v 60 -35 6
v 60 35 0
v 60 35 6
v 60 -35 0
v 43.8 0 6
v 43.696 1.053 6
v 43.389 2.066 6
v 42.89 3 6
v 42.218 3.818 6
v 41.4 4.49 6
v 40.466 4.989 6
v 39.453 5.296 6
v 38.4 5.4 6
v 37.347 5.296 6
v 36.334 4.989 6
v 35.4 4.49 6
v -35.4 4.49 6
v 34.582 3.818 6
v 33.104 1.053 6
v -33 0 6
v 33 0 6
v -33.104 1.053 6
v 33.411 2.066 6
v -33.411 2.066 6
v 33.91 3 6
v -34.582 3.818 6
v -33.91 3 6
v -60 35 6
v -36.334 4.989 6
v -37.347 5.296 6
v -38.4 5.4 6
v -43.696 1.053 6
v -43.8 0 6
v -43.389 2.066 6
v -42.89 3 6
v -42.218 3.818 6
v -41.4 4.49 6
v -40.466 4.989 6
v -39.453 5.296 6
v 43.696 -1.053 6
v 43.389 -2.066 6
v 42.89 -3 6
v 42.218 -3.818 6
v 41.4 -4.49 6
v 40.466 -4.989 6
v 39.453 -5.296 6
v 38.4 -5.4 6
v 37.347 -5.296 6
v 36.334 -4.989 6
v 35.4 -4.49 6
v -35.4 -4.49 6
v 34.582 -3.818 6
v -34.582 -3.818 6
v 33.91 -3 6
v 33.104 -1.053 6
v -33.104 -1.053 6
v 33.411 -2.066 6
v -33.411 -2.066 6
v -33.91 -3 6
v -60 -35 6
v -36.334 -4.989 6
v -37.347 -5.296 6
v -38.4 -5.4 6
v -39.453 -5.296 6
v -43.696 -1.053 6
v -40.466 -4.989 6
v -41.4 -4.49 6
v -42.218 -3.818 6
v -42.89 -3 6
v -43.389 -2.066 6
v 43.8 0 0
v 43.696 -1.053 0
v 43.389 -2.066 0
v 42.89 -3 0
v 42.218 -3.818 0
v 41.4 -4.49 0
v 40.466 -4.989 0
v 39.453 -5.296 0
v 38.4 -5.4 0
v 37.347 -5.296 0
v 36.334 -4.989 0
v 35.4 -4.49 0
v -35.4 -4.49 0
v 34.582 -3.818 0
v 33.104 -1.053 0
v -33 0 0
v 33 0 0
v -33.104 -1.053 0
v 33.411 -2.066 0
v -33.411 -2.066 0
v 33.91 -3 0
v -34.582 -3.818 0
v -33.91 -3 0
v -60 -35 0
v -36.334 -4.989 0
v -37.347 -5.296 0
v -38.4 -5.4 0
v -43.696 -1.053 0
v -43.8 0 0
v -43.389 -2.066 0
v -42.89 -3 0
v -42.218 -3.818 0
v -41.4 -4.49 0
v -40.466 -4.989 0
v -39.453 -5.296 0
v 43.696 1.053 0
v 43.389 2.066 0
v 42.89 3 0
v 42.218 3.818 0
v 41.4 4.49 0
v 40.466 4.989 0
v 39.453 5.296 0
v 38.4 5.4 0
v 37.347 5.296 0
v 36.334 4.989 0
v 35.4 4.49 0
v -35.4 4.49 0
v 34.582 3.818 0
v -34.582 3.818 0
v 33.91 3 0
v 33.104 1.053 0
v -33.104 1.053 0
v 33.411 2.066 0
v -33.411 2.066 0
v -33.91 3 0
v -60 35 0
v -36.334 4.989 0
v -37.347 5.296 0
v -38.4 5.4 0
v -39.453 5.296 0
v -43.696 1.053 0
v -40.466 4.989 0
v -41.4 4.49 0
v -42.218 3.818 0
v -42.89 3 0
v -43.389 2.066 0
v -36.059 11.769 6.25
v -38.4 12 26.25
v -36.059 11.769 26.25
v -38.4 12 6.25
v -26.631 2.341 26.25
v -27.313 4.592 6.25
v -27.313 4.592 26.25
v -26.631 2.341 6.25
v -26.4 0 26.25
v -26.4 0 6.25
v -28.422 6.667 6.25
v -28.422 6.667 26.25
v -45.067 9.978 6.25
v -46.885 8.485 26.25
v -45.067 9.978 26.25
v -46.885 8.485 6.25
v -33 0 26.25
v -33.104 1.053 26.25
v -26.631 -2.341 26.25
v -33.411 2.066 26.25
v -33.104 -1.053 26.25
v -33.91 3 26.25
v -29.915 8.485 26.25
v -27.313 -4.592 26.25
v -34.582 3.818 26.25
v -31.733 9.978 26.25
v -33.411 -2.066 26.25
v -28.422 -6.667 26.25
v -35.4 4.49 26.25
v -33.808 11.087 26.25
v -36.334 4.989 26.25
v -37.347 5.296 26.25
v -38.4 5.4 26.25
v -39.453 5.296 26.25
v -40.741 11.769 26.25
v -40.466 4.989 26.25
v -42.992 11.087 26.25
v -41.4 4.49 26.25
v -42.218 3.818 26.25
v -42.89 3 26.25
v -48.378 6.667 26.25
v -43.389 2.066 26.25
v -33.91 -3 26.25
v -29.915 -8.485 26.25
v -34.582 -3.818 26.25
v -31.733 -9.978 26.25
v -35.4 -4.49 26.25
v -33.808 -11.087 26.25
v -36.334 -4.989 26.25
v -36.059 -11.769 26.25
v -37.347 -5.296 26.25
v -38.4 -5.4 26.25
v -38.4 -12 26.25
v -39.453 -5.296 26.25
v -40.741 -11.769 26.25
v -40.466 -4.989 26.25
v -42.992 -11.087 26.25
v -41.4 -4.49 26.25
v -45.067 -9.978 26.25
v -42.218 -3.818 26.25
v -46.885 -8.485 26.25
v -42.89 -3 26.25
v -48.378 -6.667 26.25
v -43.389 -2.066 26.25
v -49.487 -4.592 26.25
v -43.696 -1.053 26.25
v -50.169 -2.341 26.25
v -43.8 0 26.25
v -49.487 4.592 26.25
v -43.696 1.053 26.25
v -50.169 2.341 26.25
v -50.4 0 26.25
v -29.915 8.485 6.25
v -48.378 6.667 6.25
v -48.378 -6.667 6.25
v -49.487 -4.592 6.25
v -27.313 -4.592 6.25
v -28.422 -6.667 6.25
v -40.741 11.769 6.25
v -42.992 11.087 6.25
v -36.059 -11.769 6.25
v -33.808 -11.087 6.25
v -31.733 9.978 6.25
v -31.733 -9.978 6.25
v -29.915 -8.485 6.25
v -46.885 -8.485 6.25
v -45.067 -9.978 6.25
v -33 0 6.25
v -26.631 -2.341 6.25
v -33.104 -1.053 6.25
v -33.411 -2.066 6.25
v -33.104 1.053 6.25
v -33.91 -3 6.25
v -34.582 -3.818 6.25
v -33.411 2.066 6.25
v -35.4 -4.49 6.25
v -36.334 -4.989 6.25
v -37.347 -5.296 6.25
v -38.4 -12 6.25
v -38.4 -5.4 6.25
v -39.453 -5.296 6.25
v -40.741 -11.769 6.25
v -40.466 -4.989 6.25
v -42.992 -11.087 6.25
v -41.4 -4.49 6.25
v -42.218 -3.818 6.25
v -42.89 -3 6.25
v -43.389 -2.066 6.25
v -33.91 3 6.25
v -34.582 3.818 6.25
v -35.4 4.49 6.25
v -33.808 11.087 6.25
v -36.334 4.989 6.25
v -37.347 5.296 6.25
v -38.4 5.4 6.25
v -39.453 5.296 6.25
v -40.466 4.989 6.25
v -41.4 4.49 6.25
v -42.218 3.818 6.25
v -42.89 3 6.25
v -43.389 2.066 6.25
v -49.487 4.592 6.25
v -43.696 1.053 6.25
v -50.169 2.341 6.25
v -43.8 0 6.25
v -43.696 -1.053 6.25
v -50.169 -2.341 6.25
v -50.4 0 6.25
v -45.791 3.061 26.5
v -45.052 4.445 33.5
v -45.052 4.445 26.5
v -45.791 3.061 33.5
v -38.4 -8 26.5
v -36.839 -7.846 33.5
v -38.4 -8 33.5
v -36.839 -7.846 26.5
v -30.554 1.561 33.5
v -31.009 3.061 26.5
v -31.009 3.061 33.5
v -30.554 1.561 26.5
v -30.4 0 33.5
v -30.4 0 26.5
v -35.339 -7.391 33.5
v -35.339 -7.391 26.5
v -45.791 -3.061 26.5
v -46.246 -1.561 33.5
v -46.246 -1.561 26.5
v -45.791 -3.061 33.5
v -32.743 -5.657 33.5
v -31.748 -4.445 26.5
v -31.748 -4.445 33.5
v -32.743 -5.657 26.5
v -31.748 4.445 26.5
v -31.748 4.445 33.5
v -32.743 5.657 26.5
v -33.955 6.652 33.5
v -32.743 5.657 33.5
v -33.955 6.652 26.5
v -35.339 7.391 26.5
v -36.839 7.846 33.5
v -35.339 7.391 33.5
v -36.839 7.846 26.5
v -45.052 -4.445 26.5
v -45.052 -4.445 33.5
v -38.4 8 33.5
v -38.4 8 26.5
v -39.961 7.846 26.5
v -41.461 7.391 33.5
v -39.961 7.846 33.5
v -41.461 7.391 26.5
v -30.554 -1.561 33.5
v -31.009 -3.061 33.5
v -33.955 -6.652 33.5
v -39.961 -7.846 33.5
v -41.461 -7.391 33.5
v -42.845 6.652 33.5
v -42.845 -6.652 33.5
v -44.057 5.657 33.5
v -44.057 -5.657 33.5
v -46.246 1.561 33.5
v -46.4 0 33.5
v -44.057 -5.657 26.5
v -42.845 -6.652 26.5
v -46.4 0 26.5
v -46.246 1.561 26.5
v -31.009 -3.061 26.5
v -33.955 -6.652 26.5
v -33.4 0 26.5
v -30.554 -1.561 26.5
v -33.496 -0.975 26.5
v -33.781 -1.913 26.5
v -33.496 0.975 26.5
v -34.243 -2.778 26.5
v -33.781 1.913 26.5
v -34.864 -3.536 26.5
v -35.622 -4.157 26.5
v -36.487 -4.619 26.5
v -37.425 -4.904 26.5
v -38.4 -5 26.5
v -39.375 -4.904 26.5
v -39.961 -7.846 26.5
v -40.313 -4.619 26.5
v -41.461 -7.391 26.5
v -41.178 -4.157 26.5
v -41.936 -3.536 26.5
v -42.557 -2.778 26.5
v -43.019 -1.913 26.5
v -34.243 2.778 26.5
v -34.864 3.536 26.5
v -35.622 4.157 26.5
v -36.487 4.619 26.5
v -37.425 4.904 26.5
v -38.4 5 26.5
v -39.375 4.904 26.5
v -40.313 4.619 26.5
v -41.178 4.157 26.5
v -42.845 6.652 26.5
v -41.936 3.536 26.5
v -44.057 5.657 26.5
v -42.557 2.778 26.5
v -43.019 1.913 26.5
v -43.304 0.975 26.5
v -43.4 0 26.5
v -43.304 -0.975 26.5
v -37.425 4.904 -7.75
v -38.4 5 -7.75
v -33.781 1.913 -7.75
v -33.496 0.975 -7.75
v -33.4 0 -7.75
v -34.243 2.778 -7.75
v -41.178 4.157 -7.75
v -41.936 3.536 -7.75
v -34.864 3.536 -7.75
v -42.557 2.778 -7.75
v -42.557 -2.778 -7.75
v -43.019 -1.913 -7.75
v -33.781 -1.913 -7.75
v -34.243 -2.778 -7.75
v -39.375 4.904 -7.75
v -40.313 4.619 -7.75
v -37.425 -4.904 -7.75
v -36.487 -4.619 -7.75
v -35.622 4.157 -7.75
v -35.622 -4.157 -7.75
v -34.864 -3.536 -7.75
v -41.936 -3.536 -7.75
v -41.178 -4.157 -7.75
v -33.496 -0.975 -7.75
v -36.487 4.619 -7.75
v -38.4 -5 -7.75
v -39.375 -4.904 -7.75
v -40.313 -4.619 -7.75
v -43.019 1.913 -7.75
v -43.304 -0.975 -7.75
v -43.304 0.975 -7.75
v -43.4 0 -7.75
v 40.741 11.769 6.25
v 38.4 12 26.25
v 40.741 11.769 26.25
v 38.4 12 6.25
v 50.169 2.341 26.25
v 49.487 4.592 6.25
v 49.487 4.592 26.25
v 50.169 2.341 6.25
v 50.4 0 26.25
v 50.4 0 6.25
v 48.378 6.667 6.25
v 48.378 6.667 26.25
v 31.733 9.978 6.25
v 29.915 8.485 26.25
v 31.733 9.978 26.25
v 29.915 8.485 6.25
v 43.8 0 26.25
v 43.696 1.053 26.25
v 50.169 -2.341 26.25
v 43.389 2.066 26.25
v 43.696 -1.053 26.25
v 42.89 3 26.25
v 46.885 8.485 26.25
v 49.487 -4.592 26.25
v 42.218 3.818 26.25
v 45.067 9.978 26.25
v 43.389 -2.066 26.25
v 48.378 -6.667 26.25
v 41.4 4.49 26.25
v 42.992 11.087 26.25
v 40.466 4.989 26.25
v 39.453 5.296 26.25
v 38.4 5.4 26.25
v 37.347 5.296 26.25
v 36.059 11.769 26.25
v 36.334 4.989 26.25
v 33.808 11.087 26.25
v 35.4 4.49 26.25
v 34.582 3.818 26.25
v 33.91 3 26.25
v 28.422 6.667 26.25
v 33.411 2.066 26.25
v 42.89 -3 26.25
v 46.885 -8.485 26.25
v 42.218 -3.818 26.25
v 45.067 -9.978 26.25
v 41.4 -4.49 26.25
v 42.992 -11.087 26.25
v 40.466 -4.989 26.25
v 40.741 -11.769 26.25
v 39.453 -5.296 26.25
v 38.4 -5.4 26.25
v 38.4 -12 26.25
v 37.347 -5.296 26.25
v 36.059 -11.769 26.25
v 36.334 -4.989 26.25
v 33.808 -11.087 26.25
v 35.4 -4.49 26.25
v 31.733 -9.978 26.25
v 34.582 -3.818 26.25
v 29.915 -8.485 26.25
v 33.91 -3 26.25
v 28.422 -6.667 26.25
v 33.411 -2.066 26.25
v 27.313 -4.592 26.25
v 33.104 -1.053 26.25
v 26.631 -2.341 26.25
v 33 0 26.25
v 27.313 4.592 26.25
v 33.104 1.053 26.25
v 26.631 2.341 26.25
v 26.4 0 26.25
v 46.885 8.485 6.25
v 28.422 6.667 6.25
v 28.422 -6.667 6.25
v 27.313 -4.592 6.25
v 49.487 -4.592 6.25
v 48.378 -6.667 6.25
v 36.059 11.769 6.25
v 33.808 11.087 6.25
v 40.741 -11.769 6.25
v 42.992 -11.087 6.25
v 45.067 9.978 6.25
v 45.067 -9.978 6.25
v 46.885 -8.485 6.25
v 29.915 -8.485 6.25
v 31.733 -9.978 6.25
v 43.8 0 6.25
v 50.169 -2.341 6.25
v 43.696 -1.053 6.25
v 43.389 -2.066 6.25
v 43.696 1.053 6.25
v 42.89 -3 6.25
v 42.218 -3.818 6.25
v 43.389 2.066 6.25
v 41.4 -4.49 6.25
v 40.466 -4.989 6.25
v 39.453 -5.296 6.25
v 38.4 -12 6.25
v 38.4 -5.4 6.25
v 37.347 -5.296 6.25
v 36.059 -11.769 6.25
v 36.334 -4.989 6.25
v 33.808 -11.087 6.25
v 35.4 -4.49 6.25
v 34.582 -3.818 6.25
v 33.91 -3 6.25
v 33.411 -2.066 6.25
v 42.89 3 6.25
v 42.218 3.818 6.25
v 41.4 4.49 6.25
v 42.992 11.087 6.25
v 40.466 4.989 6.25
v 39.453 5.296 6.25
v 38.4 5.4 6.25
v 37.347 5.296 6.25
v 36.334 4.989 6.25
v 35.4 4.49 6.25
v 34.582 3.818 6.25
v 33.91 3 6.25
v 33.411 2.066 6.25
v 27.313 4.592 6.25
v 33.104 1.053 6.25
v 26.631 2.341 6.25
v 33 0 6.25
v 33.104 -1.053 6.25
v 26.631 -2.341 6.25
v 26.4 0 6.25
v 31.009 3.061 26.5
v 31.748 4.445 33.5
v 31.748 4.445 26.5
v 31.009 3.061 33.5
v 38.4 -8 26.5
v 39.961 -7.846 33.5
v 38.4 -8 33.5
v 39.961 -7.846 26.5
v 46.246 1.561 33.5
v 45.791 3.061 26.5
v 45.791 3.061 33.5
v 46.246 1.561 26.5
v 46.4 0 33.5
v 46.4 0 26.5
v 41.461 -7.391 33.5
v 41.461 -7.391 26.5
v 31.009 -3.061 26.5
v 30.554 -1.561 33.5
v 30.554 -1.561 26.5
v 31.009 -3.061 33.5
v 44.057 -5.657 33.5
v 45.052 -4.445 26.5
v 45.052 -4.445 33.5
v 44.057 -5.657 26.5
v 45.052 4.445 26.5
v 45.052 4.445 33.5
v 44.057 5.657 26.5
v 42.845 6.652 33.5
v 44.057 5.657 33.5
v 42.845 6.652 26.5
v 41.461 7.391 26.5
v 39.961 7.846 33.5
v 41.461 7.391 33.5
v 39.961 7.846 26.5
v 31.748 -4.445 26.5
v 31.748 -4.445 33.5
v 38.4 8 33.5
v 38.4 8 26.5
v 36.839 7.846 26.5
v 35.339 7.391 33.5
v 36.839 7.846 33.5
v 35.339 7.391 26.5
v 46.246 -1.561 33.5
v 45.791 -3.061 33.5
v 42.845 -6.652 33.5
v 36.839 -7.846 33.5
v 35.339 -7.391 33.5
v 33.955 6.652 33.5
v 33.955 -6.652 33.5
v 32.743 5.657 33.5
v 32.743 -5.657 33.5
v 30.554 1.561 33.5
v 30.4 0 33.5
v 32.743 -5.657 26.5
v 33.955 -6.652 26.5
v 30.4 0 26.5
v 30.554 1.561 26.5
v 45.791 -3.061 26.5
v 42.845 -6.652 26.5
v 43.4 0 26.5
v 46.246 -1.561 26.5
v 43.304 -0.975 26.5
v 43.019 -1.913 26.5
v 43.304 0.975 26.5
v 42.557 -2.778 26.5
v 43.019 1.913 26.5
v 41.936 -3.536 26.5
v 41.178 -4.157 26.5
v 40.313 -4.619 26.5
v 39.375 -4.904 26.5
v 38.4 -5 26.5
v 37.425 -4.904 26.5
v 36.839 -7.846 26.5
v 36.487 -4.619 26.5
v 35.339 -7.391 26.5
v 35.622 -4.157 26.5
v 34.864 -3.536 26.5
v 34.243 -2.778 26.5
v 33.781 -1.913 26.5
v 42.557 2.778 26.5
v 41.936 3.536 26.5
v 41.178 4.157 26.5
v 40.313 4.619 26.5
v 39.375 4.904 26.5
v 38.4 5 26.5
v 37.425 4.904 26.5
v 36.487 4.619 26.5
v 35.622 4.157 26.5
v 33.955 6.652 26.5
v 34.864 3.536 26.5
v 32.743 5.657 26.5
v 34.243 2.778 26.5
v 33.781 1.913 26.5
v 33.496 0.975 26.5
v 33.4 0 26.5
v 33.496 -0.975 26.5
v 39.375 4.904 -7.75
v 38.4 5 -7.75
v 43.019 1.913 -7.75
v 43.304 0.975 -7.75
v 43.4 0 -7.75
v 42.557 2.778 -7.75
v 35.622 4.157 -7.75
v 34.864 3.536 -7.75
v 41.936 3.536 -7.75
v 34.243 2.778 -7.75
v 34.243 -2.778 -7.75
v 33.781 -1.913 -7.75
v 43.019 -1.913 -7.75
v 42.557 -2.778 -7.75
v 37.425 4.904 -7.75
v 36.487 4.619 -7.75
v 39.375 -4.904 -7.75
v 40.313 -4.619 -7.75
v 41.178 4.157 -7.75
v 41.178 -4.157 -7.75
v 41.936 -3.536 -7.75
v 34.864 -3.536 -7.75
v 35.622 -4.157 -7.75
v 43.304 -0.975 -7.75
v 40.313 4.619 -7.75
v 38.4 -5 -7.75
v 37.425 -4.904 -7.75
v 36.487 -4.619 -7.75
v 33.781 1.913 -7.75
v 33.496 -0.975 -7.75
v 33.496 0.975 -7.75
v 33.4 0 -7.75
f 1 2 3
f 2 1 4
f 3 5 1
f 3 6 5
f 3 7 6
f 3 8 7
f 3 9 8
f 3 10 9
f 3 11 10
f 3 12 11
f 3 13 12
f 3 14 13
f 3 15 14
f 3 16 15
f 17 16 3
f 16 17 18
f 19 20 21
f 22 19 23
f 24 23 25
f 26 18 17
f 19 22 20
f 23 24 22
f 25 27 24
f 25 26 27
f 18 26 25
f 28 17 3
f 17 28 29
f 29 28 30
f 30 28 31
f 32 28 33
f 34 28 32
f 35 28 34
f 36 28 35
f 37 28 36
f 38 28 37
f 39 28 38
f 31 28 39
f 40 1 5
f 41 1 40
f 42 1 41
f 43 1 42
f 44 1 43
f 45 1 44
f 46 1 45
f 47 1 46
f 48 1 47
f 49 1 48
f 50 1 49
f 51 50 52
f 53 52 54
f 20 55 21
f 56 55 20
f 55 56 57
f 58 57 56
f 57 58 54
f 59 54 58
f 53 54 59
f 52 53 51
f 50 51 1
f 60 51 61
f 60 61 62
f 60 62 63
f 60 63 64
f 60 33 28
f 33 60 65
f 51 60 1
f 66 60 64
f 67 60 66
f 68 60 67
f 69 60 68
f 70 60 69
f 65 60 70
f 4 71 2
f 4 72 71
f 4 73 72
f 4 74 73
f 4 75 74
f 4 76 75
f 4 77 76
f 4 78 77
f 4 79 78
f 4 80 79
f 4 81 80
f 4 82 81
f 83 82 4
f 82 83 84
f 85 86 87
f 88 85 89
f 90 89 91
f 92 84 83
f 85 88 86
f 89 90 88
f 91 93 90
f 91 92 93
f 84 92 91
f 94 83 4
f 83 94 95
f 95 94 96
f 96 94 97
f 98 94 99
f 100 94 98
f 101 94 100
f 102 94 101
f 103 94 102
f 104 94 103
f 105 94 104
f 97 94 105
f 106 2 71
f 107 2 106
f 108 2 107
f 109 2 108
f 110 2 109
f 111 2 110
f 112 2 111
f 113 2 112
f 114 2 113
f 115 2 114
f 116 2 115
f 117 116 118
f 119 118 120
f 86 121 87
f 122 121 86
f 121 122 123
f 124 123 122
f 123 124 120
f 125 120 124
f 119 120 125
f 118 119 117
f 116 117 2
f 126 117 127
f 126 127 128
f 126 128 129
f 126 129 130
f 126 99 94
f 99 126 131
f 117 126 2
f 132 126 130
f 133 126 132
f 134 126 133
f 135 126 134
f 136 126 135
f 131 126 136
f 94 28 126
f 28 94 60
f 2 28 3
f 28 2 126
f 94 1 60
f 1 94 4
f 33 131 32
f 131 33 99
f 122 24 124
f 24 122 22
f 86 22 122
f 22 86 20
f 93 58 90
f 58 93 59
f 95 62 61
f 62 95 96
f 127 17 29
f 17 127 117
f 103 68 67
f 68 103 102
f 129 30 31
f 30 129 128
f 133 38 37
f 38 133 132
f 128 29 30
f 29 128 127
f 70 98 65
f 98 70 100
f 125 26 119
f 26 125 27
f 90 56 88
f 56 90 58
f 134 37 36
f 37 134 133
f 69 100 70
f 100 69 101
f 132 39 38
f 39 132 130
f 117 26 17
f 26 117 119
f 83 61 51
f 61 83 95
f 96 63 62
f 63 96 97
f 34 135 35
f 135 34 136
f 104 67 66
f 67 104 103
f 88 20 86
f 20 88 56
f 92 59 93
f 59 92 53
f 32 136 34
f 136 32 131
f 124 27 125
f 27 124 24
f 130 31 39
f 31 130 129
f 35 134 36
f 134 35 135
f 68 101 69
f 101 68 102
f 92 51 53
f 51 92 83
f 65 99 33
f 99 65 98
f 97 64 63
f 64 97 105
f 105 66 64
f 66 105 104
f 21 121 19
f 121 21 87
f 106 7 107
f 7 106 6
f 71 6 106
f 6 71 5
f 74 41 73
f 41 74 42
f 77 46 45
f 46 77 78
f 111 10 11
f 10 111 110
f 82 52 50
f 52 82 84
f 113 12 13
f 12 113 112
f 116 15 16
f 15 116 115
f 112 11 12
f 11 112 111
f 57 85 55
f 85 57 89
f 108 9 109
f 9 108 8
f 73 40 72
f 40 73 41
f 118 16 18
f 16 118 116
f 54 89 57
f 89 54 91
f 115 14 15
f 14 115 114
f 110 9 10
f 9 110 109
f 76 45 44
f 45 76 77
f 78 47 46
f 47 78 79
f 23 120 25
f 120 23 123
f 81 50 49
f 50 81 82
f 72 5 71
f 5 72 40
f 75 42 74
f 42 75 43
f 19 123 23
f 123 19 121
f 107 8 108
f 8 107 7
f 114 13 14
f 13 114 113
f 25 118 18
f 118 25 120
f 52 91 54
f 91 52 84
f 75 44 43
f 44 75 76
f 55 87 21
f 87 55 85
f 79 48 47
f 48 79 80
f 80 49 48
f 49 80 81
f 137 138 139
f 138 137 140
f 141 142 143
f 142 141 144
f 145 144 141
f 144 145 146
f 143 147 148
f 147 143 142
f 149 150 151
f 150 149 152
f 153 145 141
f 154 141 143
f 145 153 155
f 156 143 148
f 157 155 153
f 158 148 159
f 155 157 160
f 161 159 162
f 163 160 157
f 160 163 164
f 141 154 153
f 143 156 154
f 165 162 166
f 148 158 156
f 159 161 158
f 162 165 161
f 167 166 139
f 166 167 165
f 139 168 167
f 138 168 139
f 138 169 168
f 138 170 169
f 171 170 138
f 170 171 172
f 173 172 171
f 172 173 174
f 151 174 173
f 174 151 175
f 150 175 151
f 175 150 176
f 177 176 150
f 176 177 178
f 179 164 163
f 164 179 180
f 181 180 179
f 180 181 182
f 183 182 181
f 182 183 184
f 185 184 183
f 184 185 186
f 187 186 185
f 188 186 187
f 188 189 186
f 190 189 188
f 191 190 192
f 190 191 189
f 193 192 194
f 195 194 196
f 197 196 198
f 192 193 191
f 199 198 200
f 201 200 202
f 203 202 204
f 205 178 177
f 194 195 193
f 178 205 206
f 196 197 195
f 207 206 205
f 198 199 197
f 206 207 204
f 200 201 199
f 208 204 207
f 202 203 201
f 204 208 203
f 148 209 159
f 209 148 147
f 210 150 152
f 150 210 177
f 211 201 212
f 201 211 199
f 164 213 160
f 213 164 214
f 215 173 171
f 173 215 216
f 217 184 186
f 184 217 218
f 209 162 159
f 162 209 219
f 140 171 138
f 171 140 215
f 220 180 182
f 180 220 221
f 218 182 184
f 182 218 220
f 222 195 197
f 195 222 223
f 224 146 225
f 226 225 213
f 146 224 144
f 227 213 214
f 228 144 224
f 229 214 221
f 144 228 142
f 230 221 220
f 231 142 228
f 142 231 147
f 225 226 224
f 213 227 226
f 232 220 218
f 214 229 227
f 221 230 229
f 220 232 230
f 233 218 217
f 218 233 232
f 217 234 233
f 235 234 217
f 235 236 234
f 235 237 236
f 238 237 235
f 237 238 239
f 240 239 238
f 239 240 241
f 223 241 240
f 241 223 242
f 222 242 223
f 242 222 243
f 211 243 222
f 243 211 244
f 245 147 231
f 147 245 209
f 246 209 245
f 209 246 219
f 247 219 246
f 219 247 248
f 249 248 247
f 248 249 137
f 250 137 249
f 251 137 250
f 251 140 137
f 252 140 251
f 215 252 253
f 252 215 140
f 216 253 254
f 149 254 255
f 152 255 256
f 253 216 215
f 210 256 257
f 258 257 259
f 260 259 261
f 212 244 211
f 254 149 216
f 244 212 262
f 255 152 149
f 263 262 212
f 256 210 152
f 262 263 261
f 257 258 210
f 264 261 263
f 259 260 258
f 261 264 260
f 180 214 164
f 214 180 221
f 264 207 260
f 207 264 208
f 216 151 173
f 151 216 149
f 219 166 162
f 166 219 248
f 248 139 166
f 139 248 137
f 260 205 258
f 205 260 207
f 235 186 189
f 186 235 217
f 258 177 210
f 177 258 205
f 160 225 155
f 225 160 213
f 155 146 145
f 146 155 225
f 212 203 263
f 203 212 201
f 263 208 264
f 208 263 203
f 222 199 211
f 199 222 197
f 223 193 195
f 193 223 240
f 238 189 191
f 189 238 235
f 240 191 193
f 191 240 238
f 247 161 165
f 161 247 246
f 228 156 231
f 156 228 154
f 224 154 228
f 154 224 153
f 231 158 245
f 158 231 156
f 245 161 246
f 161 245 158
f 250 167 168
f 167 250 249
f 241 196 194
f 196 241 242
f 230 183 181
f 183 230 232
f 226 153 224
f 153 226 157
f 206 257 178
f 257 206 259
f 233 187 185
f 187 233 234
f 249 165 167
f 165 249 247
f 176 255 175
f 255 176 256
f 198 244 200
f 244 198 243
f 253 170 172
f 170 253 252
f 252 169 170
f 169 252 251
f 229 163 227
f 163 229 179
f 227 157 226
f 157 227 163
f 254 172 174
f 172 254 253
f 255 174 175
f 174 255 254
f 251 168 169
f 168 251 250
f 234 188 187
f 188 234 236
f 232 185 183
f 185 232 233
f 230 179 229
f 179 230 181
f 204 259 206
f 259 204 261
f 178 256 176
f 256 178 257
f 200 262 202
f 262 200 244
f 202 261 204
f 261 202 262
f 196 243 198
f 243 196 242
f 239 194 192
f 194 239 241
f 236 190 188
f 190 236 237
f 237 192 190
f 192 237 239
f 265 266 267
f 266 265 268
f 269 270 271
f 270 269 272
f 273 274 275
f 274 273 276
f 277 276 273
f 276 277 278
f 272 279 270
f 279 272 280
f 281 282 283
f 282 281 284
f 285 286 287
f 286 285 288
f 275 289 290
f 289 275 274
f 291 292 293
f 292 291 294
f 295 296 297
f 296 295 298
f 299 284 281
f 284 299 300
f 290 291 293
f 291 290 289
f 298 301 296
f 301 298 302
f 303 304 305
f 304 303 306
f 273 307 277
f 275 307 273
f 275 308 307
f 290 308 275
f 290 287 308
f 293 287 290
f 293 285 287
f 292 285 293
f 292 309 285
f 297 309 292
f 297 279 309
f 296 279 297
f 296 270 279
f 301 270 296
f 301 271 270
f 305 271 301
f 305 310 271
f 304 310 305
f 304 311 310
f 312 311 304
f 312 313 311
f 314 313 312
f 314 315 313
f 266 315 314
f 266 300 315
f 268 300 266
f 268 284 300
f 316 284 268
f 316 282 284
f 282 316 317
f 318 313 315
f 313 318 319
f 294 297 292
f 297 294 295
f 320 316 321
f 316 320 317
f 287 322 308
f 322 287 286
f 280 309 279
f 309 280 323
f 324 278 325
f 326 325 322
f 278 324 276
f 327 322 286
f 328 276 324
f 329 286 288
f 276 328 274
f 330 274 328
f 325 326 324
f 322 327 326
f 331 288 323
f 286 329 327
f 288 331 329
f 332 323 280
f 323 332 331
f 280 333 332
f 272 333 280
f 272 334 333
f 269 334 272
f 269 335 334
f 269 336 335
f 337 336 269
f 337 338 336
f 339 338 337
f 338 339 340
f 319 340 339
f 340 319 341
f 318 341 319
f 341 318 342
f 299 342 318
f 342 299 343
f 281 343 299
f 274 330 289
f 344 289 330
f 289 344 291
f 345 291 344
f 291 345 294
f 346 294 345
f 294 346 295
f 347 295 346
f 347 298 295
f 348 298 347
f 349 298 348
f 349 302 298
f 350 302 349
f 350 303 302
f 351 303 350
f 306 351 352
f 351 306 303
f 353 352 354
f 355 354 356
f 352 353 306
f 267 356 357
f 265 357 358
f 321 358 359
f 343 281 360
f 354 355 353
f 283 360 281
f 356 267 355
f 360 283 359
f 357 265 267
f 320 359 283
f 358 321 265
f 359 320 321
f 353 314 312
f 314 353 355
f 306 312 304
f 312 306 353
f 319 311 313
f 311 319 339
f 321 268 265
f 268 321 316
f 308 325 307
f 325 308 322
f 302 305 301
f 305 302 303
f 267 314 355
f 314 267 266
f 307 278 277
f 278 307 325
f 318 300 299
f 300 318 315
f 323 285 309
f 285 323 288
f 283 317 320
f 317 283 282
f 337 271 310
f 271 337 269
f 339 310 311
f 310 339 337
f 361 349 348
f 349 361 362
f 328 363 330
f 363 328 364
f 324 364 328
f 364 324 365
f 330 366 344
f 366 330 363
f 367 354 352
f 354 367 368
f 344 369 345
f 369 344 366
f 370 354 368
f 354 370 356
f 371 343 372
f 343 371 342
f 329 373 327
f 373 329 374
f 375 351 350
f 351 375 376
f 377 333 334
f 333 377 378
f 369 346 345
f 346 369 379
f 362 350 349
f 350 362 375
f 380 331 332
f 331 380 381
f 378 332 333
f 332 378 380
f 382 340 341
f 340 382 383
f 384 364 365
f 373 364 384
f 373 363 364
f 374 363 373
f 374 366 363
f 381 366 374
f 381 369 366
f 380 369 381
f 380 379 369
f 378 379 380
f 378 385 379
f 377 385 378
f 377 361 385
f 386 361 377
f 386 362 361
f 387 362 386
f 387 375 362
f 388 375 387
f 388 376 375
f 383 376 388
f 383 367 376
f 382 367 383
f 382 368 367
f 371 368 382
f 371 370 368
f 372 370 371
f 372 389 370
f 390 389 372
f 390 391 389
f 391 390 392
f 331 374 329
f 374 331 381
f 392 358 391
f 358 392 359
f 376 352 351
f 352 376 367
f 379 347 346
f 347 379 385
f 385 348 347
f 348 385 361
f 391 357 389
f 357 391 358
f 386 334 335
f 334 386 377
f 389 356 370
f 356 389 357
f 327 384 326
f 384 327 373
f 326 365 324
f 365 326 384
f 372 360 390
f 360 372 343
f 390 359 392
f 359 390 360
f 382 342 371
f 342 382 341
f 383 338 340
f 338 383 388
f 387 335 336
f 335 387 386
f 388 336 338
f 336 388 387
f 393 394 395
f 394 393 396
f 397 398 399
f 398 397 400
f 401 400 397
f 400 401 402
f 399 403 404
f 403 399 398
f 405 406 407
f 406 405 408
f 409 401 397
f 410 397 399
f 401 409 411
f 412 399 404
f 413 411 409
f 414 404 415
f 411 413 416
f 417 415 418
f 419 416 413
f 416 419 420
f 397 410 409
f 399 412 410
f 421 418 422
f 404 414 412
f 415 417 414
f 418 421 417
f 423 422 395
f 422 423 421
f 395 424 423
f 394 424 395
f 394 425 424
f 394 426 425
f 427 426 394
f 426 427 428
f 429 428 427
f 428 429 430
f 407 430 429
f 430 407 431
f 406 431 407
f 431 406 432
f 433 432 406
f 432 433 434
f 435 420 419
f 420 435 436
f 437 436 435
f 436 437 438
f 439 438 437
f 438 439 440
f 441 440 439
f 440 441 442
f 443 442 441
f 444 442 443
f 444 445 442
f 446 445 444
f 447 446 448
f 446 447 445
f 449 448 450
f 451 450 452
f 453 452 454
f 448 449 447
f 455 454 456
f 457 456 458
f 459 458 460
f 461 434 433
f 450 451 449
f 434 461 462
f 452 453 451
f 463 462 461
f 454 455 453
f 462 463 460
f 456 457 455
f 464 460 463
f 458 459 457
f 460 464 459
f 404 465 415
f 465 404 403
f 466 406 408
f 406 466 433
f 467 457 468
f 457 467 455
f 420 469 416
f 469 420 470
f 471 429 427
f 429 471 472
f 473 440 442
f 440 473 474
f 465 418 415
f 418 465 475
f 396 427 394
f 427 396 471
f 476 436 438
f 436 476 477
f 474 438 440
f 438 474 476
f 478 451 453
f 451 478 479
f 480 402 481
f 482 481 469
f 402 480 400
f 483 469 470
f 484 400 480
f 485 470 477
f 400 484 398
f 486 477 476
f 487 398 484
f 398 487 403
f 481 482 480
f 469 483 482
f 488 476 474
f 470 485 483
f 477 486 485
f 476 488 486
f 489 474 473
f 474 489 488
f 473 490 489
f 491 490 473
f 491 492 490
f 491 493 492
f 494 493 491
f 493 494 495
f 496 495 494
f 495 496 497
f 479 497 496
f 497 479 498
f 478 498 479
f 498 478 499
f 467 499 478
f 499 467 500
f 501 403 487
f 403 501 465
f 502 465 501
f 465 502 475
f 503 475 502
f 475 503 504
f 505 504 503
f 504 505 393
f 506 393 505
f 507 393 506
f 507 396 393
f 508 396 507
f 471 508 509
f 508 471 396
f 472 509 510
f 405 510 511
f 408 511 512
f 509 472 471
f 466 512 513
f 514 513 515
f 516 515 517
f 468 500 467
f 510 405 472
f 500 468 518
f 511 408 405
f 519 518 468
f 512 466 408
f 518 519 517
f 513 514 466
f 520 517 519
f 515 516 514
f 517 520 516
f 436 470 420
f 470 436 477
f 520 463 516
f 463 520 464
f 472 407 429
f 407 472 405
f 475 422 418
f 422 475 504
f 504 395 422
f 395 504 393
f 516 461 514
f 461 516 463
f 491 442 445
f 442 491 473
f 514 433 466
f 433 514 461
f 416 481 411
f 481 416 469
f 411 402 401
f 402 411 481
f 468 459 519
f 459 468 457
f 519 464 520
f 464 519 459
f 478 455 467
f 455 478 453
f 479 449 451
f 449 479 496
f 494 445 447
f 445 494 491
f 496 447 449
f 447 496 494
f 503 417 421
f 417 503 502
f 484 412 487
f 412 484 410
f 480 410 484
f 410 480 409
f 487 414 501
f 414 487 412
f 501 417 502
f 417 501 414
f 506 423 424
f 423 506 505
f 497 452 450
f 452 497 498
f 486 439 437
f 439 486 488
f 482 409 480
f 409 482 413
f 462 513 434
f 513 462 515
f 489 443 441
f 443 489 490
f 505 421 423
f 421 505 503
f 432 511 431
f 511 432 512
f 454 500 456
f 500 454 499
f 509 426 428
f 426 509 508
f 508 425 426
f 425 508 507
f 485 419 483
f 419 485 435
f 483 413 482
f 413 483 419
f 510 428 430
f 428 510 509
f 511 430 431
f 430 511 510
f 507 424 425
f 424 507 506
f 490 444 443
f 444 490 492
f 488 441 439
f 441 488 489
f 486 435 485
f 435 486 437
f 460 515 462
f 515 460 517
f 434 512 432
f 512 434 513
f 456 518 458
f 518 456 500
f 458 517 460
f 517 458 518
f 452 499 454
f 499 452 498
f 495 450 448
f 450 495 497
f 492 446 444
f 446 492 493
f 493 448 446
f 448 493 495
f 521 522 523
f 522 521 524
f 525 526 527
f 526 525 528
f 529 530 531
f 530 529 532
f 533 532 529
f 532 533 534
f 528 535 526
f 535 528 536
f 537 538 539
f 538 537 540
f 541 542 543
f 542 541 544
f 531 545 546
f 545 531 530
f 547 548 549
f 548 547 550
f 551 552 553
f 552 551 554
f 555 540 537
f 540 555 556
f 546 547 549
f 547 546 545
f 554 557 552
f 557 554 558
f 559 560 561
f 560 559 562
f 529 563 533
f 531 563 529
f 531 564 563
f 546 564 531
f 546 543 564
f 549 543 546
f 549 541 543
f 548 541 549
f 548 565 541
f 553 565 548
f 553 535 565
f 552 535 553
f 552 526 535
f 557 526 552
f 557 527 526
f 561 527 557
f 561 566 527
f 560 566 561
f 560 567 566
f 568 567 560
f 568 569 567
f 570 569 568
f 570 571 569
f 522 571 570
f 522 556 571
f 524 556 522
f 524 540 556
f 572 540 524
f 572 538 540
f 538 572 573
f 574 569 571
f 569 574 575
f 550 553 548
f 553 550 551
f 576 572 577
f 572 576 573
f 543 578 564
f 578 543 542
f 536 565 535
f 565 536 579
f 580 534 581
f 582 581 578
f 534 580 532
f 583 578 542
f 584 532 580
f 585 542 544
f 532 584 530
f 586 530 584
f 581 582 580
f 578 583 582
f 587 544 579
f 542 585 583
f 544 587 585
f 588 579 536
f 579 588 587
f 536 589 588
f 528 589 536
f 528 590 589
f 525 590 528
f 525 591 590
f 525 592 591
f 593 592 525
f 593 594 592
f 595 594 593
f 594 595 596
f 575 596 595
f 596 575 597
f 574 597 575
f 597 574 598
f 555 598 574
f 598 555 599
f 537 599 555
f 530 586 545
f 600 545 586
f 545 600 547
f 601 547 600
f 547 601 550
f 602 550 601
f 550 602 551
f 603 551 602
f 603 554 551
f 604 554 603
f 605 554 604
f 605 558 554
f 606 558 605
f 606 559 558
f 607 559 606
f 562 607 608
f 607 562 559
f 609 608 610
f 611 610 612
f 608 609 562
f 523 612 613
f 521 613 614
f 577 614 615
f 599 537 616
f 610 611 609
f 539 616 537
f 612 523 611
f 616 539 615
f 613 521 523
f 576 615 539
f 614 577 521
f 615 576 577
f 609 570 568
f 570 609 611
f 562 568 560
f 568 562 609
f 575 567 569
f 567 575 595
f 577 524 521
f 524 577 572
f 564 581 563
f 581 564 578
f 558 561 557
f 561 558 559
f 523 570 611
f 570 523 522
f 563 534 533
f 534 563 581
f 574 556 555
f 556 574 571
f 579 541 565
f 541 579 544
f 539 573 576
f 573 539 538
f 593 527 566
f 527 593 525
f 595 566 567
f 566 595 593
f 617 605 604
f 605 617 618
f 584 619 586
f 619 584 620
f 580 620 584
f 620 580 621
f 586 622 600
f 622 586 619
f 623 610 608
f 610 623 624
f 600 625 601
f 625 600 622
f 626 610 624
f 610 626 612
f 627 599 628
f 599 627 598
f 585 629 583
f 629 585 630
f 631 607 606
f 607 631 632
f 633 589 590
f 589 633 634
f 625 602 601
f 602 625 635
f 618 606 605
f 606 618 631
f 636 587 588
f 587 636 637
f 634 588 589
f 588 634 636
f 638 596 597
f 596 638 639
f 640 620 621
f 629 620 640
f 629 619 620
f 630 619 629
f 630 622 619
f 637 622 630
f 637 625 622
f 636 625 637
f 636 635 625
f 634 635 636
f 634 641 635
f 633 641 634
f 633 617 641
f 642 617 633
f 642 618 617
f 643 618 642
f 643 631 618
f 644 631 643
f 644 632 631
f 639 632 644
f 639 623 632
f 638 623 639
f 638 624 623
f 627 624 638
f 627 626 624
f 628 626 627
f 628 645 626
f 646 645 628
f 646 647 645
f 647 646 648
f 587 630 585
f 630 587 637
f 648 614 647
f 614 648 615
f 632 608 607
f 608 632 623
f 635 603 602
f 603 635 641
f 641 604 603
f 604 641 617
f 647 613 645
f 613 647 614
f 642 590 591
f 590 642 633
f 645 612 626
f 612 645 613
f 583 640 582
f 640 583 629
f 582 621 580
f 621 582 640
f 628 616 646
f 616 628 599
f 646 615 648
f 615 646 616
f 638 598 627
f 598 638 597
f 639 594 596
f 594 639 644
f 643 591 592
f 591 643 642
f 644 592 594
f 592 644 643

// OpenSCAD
$fn = 32;

// ------------------------------------------------------------------------
// Standoff columns: 2 d24 standoffs, bolts d10
// Every part is its own module, assembly() places them once.
// ------------------------------------------------------------------------

// --- part 1 ---
module base_plate() {
  difference() {
    translate([-60, -35, 0]) cube([120, 70, 6]);
    translate([-38.4, 0, -1]) cylinder(h = 8, d = 10.8);
    translate([38.4, 0, -1]) cylinder(h = 8, d = 10.8);
  }
}

// --- part 2 ---
module spacer1() {
  difference() {
      translate([0, 0, 0]) cylinder(h = 20, d = 24);
      translate([0, 0, -1]) cylinder(h = 22, d = 10.8);
    }
}

// --- part 3 ---
module bolt1() {
  cylinder(h = 7, d = 16);
  translate([0, 0, -34.25]) cylinder(h = 34.25, d = 10);
}

// --- part 4 ---
module spacer2() {
  difference() {
      translate([0, 0, 0]) cylinder(h = 20, d = 24);
      translate([0, 0, -1]) cylinder(h = 22, d = 10.8);
    }
}

// --- part 5 ---
module bolt2() {
  cylinder(h = 7, d = 16);
  translate([0, 0, -34.25]) cylinder(h = 34.25, d = 10);
}

// --- assembly ---
module assembly() {
  translate([0, 0, 0]) rotate([0, 0, 0]) base_plate();
  translate([-38.4, 0, 6.25]) rotate([0, 0, 0]) spacer1();
  translate([-38.4, 0, 26.5]) rotate([0, 0, 0]) bolt1();
  translate([38.4, 0, 6.25]) rotate([0, 0, 0]) spacer2();
  translate([38.4, 0, 26.5]) rotate([0, 0, 0]) bolt2();
}

assembly();
